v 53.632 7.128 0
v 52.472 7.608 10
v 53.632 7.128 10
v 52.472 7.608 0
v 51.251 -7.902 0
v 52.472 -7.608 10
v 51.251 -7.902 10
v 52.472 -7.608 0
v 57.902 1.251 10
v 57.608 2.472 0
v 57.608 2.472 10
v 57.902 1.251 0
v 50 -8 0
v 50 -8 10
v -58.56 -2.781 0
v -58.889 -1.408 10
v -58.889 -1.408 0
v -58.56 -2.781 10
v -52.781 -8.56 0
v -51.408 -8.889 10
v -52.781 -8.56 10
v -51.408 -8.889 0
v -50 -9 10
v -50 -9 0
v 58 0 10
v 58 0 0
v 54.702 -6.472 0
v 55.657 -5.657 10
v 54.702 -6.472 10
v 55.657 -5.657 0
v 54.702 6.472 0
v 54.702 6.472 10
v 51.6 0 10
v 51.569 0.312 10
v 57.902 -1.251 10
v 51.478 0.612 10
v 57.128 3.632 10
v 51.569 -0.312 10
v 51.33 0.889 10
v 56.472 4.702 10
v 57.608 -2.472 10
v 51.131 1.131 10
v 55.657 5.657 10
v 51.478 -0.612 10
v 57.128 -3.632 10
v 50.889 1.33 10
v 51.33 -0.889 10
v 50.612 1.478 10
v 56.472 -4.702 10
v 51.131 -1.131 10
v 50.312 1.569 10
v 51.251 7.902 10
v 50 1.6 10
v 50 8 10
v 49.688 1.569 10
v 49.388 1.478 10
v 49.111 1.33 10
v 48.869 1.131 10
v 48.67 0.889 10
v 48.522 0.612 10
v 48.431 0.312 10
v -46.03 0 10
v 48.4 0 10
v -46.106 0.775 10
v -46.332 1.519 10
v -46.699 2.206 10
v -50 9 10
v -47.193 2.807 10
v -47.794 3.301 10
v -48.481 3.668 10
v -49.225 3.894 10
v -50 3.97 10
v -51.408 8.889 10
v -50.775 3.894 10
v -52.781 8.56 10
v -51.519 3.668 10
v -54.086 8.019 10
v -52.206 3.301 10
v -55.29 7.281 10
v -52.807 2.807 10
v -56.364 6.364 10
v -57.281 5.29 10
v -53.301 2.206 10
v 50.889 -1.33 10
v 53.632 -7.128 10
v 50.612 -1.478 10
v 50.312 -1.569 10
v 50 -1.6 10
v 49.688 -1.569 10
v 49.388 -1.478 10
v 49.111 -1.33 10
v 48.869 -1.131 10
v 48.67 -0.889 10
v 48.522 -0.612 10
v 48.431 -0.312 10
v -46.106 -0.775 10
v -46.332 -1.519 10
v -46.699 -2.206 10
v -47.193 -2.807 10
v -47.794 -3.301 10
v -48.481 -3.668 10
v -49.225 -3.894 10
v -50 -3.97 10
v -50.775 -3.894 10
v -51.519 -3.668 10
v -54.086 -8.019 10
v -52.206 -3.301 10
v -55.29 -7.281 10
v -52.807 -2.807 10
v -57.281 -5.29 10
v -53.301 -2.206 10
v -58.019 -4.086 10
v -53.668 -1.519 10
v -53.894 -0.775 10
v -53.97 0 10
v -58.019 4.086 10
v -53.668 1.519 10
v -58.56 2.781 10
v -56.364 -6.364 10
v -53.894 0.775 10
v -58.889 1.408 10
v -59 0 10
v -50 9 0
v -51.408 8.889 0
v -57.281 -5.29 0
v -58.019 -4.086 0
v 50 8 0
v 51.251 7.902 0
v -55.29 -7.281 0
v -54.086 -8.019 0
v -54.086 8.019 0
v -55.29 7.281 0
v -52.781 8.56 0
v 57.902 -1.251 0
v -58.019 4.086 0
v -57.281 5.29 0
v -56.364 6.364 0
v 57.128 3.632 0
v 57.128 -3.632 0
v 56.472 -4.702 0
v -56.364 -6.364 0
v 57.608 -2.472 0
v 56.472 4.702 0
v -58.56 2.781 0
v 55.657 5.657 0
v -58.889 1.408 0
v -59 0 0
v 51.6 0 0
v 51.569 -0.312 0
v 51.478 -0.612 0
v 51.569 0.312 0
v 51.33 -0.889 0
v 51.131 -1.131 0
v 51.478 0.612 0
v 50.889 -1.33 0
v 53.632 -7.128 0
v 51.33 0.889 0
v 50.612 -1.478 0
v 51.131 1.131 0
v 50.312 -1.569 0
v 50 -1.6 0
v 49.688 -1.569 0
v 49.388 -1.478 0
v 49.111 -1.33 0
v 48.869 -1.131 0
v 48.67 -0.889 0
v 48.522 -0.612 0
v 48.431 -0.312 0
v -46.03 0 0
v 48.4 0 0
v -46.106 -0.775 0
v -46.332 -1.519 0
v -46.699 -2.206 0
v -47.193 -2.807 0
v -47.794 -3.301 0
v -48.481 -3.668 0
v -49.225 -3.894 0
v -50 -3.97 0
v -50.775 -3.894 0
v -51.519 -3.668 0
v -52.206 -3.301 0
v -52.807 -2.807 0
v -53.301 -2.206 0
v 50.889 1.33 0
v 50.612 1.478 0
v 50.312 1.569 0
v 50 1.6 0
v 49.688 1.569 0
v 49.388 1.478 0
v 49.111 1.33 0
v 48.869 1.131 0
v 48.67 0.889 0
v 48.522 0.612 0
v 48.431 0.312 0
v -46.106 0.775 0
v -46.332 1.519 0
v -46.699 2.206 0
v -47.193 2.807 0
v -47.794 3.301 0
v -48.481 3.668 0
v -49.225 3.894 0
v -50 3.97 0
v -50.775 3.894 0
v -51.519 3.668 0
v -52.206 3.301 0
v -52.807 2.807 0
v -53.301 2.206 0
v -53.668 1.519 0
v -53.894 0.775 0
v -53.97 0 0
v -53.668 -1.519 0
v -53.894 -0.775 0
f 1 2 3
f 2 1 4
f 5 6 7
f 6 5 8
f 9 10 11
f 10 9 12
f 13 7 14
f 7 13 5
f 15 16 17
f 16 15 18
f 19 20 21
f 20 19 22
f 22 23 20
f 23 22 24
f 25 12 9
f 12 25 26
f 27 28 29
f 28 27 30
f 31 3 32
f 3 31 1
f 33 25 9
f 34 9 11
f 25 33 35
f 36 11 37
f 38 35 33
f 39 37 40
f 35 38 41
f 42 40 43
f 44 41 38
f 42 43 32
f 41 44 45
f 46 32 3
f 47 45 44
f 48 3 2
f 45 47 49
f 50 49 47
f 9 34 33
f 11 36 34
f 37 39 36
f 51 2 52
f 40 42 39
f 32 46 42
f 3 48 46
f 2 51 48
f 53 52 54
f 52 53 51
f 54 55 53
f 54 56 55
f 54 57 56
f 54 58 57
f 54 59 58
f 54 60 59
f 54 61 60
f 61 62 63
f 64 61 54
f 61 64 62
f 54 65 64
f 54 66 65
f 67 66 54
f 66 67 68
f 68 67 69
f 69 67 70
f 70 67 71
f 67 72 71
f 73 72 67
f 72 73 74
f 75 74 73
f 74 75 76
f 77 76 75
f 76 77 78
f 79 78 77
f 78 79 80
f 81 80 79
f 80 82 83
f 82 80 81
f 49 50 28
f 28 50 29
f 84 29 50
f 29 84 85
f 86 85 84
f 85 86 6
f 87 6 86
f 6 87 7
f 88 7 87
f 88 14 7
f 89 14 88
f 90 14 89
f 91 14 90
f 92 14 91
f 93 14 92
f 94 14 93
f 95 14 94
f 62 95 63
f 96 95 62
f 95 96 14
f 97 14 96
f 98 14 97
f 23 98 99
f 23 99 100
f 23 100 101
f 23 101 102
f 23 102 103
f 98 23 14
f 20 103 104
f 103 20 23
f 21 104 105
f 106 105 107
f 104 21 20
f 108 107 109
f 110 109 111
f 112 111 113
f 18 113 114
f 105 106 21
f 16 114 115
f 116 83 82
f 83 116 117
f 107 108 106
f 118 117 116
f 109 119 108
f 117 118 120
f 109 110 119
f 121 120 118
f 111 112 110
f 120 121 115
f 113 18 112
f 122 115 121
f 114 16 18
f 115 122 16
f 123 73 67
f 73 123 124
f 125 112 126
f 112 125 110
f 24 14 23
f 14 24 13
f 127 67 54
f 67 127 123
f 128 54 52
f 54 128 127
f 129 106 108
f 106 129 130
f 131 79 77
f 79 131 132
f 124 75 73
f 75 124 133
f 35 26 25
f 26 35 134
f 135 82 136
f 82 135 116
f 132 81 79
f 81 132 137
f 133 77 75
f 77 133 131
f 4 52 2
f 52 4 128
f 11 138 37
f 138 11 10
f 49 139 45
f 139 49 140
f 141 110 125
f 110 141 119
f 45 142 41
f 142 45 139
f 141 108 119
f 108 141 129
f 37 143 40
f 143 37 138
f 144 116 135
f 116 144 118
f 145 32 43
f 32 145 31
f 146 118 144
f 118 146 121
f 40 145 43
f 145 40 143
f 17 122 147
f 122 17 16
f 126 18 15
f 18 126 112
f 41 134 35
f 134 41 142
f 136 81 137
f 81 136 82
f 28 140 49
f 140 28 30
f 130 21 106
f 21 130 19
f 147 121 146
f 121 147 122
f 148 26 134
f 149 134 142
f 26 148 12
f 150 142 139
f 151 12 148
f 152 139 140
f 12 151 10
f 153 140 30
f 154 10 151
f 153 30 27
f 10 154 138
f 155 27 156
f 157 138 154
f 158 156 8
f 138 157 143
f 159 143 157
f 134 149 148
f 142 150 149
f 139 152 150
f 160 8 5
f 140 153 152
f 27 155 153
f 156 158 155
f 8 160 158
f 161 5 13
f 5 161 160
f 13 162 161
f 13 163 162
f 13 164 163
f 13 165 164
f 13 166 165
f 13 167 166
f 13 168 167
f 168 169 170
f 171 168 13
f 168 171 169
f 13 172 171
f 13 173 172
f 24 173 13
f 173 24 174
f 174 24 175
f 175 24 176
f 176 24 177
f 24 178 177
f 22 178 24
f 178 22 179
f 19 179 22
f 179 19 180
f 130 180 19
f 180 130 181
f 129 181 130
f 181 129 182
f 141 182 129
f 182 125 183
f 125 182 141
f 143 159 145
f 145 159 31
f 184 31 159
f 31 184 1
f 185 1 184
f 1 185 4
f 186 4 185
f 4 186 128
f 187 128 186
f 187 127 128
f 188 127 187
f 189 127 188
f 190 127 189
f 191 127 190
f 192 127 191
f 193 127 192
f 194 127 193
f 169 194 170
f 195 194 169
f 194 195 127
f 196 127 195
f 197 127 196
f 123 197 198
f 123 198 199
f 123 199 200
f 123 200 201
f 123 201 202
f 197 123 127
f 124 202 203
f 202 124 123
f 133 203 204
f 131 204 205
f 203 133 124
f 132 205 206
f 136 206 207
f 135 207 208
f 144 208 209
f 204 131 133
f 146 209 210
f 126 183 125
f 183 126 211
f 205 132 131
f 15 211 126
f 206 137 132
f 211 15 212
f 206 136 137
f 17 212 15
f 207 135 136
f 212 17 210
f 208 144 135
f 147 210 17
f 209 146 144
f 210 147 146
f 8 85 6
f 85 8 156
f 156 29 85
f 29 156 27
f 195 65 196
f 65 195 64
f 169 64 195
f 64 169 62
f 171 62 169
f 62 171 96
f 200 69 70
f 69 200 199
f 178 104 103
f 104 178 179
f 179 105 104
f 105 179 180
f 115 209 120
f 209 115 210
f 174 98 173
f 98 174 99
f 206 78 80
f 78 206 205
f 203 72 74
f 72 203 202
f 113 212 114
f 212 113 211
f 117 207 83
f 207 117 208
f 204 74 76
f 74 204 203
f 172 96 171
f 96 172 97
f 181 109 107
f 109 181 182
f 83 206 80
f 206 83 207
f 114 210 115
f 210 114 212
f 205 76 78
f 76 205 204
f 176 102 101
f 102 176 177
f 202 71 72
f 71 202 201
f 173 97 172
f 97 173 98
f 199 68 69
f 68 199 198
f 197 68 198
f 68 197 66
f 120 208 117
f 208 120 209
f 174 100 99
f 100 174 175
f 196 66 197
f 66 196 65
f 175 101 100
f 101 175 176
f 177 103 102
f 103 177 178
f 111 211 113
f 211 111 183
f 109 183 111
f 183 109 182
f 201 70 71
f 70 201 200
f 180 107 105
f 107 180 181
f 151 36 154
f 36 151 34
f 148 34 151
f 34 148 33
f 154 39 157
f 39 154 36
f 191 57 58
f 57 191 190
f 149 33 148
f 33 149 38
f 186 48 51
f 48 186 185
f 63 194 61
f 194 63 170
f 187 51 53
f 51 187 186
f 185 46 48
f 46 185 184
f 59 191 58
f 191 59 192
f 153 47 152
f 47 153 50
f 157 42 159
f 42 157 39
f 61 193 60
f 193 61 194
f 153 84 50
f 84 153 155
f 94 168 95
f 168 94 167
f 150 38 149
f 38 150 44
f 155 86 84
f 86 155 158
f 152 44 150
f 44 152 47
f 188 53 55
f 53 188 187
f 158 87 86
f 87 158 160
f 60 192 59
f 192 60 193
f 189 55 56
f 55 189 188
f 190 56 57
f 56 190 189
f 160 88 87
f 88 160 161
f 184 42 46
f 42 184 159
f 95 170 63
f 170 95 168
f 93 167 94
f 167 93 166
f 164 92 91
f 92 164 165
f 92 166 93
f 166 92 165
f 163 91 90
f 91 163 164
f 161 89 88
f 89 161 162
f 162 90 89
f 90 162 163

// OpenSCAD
$fn = 32;

// ----------------------------------------------------------------------
// Lever: 100 mm between the bosses, 10 mm thick, smooth outline
// ----------------------------------------------------------------------

// --- parameters (mm) ---
lever_l = 100;            // distance between the boss centres
boss_a = 18;              // first boss diameter
boss_b = 16;              // second boss diameter
bore_a = 7.94;            // first bore
bore_b = 3.2;             // second bore
lever_t = 10;             // lever thickness

lever_profile = [[-59, 0], [-58.889, -1.408], [-58.56, -2.781], [-58.019, -4.086], [-57.281, -5.29], [-56.364, -6.364], [-55.29, -7.281], [-54.086, -8.019], [-52.781, -8.56], [-51.408, -8.889], [-50, -9], [50, -8], [51.251, -7.902], [52.472, -7.608], [53.632, -7.128], [54.702, -6.472], [55.657, -5.657], [56.472, -4.702], [57.128, -3.632], [57.608, -2.472], [57.902, -1.251], [58, 0], [57.902, 1.251], [57.608, 2.472], [57.128, 3.632], [56.472, 4.702], [55.657, 5.657], [54.702, 6.472], [53.632, 7.128], [52.472, 7.608], [51.251, 7.902], [50, 8], [-50, 9], [-51.408, 8.889], [-52.781, 8.56], [-54.086, 8.019], [-55.29, 7.281], [-56.364, 6.364], [-57.281, 5.29], [-58.019, 4.086], [-58.56, 2.781], [-58.889, 1.408]];

difference() {
  linear_extrude(height = lever_t) polygon(lever_profile);
  translate([-50, 0, -2.5]) cylinder(h = lever_t + 5, d = bore_a);
  translate([50, 0, -2.5]) cylinder(h = lever_t + 5, d = bore_b);
}
